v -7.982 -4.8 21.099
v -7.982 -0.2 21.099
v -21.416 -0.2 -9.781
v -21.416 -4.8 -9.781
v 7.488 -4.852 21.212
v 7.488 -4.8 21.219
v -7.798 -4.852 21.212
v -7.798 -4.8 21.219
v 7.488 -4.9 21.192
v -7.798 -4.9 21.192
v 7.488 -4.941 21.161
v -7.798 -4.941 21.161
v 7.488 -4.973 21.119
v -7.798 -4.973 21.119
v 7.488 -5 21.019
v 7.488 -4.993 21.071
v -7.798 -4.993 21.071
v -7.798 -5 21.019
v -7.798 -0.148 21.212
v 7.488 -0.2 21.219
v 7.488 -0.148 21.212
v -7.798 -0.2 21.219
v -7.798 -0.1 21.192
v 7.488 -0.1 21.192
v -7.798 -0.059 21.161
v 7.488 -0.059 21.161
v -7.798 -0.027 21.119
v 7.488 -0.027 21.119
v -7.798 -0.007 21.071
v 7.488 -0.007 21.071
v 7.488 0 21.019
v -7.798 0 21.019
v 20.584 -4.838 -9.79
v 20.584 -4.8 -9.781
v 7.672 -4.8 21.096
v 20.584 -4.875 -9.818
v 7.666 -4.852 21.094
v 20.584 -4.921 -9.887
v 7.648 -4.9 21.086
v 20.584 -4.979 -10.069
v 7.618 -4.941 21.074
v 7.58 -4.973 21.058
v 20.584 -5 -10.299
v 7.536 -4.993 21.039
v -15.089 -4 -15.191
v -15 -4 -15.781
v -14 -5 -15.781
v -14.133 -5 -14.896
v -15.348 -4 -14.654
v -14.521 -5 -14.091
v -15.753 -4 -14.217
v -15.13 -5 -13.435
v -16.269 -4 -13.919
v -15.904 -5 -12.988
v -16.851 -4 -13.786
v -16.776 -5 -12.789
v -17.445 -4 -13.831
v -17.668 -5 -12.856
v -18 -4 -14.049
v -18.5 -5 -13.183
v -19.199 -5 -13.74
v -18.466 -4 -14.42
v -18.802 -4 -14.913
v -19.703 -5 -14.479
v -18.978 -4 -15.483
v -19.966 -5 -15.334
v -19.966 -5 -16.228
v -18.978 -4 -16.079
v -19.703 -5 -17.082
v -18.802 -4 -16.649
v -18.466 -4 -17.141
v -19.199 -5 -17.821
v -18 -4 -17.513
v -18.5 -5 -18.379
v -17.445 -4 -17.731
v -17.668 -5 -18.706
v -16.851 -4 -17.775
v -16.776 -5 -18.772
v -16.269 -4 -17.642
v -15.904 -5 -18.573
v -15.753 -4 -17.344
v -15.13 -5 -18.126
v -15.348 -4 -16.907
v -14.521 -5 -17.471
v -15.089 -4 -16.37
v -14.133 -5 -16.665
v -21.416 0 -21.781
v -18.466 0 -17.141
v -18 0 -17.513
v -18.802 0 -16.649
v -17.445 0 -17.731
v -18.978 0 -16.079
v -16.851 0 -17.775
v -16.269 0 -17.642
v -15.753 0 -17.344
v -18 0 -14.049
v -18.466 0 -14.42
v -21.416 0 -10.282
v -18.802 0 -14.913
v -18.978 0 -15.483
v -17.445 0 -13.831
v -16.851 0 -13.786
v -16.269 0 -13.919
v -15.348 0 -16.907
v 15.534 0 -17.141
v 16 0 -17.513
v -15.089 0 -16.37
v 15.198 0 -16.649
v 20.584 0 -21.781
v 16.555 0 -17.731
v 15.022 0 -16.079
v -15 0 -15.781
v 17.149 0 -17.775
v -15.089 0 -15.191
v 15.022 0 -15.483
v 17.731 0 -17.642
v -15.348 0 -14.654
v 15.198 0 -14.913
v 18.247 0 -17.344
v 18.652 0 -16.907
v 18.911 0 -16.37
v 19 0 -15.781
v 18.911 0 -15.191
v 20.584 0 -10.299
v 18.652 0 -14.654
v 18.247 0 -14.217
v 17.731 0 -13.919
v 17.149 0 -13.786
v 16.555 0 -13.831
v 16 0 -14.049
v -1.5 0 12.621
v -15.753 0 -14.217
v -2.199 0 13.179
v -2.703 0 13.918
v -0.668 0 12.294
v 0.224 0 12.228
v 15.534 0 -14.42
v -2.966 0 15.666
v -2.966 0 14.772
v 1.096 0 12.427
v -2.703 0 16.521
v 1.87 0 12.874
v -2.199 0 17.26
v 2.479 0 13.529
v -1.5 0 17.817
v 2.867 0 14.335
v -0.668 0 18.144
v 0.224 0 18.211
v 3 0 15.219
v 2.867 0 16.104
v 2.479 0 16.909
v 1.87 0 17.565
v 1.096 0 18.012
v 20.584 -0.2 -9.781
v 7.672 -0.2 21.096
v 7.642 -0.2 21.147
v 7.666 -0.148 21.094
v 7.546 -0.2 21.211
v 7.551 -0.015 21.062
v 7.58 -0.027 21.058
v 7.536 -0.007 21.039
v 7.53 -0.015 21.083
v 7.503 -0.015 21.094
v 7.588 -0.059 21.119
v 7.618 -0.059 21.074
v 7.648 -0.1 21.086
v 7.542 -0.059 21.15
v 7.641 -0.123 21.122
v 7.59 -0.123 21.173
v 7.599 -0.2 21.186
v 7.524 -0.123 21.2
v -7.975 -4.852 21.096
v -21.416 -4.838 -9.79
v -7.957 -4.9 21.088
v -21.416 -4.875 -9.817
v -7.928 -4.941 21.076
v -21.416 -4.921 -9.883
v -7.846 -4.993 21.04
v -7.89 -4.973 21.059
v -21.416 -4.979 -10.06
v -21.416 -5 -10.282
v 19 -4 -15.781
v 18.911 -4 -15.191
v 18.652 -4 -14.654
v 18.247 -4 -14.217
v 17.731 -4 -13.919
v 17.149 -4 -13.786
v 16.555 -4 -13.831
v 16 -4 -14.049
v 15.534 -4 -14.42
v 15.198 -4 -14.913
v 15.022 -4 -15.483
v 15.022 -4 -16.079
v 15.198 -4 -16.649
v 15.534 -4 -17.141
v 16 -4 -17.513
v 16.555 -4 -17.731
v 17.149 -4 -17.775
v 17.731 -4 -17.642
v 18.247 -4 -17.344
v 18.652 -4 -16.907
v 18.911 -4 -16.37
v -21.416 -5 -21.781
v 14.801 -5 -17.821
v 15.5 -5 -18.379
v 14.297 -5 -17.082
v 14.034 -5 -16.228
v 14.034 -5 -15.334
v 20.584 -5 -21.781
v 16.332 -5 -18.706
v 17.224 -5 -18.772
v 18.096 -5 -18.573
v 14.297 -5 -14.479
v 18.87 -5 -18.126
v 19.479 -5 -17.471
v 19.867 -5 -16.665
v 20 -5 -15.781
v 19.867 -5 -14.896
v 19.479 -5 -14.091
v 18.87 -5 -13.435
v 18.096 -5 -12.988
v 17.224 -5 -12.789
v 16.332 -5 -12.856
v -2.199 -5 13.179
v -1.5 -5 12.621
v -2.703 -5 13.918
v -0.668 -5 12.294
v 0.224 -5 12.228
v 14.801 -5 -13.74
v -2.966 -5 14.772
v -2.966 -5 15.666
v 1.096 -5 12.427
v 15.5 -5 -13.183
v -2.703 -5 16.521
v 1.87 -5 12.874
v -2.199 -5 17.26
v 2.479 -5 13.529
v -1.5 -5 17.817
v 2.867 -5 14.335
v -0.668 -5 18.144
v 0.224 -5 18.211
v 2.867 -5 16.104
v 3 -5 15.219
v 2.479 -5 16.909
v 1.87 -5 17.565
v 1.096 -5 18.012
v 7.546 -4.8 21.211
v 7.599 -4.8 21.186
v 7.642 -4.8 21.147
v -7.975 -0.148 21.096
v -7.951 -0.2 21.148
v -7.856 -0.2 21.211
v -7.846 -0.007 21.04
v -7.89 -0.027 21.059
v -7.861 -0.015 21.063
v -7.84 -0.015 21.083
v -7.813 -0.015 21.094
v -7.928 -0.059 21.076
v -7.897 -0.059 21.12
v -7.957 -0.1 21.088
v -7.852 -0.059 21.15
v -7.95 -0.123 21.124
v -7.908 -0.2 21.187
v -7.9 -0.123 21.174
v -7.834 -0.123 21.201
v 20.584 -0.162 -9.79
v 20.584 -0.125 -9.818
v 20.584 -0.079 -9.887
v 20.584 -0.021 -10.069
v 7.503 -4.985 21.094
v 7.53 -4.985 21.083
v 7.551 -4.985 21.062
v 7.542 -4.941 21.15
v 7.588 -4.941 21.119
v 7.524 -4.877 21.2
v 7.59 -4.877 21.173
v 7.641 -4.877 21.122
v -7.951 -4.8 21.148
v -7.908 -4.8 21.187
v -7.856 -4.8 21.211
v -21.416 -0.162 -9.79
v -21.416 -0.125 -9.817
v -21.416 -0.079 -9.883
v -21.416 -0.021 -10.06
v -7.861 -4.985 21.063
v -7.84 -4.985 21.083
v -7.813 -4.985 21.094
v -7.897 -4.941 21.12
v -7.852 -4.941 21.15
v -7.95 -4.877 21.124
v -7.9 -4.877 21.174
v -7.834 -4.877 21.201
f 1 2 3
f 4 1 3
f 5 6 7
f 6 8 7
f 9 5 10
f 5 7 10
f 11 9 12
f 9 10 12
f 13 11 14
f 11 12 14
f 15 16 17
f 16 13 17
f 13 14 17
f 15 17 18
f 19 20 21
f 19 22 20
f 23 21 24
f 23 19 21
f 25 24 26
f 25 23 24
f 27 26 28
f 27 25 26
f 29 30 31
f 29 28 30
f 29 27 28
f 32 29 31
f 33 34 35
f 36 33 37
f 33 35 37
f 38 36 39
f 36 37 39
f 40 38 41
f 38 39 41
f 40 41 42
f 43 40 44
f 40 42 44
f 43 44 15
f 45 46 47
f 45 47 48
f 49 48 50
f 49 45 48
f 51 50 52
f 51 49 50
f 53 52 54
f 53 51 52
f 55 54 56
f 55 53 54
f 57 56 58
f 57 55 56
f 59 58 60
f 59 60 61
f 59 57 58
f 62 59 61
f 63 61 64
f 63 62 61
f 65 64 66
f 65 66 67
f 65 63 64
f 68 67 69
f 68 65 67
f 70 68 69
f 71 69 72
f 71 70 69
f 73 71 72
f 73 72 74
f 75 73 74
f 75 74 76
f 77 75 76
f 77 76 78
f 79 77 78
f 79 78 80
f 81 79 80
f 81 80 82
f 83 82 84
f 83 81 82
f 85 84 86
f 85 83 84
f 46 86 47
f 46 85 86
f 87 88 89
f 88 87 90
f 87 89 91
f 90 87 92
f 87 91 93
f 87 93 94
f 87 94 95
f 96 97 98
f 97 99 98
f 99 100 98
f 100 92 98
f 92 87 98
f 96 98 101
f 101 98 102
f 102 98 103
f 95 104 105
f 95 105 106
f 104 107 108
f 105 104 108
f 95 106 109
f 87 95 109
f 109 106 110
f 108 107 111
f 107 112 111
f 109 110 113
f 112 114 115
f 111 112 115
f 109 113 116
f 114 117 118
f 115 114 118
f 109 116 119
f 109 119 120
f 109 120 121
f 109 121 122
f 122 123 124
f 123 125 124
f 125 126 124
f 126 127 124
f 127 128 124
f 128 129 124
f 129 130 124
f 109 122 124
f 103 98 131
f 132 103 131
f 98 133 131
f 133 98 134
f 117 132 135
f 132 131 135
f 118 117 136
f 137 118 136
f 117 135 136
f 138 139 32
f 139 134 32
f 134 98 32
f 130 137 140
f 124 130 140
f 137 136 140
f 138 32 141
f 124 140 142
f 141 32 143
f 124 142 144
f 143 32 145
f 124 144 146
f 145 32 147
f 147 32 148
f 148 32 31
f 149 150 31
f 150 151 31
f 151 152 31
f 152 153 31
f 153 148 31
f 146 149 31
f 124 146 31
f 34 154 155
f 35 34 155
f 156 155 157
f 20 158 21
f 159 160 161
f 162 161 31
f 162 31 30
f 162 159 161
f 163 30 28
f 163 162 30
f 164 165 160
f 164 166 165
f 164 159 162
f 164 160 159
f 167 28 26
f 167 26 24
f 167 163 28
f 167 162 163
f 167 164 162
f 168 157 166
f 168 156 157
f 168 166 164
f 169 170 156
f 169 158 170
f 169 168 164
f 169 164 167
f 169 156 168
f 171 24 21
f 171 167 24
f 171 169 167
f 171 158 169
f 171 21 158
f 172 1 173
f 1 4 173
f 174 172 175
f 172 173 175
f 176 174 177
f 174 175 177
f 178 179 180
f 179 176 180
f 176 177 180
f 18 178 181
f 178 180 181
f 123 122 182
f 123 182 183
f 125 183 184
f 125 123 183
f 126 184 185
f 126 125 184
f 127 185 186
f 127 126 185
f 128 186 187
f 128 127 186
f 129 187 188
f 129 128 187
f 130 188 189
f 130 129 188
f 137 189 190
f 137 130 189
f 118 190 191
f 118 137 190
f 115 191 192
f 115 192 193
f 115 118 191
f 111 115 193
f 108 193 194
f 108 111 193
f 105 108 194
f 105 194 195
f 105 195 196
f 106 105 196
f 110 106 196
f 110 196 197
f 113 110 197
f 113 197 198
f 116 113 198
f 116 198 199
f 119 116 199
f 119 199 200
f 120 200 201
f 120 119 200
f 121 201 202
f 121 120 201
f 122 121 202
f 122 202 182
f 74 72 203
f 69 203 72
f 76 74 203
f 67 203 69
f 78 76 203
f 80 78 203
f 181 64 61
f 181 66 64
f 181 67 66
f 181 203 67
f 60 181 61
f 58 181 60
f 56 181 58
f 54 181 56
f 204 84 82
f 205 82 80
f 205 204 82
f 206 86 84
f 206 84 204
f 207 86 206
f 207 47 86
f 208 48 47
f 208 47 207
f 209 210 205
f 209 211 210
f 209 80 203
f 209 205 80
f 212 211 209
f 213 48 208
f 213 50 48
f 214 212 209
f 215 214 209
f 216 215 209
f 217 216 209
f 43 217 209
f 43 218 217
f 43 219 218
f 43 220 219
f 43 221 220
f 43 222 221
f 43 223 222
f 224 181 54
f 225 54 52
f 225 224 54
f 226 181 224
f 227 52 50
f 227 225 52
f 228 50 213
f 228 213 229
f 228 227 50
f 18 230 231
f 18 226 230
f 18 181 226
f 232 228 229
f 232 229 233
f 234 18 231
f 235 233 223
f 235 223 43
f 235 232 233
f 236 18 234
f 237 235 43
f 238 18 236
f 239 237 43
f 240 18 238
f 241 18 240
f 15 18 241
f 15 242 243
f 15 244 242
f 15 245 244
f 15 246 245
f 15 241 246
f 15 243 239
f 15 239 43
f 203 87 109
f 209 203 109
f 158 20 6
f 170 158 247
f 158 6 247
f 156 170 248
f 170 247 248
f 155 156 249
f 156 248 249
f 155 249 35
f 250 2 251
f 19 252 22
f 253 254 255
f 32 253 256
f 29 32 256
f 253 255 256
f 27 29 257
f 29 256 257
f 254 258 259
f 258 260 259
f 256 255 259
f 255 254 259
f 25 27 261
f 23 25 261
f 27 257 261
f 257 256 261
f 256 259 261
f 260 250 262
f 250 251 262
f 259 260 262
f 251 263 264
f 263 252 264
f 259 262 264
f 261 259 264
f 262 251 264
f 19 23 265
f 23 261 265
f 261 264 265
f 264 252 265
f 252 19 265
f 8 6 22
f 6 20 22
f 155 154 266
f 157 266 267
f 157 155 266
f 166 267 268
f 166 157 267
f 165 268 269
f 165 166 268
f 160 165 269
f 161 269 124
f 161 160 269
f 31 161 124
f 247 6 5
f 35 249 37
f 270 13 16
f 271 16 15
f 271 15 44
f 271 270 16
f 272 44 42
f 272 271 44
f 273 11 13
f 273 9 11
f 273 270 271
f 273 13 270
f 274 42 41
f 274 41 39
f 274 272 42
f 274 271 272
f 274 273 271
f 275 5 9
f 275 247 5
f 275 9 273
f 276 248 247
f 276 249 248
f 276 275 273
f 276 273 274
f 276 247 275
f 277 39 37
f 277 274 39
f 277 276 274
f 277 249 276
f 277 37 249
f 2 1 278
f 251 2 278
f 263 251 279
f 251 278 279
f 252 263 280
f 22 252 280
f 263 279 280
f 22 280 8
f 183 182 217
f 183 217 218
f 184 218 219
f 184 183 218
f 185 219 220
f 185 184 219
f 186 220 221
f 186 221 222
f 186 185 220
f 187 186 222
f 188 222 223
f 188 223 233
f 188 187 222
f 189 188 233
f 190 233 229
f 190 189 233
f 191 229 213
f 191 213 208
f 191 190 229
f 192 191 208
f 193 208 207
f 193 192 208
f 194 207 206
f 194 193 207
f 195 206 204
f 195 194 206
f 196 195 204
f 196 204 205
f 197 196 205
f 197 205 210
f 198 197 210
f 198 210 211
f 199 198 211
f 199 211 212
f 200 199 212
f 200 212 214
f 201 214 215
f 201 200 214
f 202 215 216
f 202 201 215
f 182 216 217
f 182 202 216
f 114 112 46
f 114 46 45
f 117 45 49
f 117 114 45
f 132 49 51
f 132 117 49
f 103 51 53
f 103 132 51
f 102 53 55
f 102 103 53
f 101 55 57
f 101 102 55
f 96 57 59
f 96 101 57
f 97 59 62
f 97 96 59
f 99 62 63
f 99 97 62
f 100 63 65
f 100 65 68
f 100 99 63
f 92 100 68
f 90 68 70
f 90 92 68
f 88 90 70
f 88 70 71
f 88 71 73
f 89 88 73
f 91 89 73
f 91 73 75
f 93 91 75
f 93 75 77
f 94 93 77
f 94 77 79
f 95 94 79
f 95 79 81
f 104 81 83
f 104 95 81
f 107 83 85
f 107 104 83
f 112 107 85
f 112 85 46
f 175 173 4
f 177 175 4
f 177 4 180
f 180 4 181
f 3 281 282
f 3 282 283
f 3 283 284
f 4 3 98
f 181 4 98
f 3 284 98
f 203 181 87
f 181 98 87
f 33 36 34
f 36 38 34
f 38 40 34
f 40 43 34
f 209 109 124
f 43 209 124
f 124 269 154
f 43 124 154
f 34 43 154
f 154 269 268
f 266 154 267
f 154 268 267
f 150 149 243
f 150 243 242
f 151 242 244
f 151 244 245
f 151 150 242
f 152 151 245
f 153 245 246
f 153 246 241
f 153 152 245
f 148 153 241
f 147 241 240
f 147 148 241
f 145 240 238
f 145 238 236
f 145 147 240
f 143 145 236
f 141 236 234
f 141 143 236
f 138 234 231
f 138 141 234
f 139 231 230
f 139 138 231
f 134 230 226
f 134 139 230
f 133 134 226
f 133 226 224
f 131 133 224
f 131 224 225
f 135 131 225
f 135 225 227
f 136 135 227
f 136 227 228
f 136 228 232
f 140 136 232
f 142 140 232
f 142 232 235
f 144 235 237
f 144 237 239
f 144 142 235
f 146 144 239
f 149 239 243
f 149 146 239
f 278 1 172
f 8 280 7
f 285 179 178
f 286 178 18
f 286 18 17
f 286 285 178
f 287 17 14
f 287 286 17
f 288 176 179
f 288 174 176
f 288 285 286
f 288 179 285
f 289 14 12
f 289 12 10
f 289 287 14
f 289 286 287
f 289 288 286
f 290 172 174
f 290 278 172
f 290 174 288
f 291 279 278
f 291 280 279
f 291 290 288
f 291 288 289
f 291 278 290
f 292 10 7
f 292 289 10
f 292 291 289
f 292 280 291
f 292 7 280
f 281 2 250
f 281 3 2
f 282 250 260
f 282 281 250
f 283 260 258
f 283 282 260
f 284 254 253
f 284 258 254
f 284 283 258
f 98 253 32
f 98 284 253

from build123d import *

# Parameters (mm, degrees)
F0_R     = 2
F0_R_2   = 3
F1_DEPTH = 5
F2_R     = 0.2
F3_SIZE  = 1


with BuildPart() as f1:
    # F0 (on Front) → F1 (new body)
    with BuildSketch(Plane.XZ):
        Polygon((-21.416343, -9.780747), (-21.416343, -21.780747), (20.583657, -21.780747), (20.583657, -9.780747), (7.621113, 21.219253), (-7.929415, 21.219253), align=None)
        with Locations((-17, -15.780747)):
            Circle(F0_R, mode=Mode.SUBTRACT)
        with Locations((17, -15.780747)):
            Circle(F0_R, mode=Mode.SUBTRACT)
        with Locations((0, 15.219253)):
            Circle(F0_R_2, mode=Mode.SUBTRACT)
    extrude(amount=F1_DEPTH)

    # F2
    f2_edges = [f1.edges().sort_by_distance(p)[0] for p in [
        (-14.672879, -5, 5.719253),
        (-0.154151, -5, 21.219253),
        (14.102385, -5, 5.719253),
        (14.102385, 0, 5.719253),
        (-0.154151, 0, 21.219253),
        (7.621113, -2.5, 21.219253),
        (-7.929415, -2.5, 21.219253),
        (-14.672879, 0, 5.719253),
    ]]
    fillet(f2_edges, radius=F2_R)

    # F3
    f3_edges = [f1.edges().sort_by_distance(p)[0] for p in [
        (-19, -5, -15.780747),
        (15, -5, -15.780747),
    ]]
    chamfer(f3_edges, length=F3_SIZE)


solid = f1.part
